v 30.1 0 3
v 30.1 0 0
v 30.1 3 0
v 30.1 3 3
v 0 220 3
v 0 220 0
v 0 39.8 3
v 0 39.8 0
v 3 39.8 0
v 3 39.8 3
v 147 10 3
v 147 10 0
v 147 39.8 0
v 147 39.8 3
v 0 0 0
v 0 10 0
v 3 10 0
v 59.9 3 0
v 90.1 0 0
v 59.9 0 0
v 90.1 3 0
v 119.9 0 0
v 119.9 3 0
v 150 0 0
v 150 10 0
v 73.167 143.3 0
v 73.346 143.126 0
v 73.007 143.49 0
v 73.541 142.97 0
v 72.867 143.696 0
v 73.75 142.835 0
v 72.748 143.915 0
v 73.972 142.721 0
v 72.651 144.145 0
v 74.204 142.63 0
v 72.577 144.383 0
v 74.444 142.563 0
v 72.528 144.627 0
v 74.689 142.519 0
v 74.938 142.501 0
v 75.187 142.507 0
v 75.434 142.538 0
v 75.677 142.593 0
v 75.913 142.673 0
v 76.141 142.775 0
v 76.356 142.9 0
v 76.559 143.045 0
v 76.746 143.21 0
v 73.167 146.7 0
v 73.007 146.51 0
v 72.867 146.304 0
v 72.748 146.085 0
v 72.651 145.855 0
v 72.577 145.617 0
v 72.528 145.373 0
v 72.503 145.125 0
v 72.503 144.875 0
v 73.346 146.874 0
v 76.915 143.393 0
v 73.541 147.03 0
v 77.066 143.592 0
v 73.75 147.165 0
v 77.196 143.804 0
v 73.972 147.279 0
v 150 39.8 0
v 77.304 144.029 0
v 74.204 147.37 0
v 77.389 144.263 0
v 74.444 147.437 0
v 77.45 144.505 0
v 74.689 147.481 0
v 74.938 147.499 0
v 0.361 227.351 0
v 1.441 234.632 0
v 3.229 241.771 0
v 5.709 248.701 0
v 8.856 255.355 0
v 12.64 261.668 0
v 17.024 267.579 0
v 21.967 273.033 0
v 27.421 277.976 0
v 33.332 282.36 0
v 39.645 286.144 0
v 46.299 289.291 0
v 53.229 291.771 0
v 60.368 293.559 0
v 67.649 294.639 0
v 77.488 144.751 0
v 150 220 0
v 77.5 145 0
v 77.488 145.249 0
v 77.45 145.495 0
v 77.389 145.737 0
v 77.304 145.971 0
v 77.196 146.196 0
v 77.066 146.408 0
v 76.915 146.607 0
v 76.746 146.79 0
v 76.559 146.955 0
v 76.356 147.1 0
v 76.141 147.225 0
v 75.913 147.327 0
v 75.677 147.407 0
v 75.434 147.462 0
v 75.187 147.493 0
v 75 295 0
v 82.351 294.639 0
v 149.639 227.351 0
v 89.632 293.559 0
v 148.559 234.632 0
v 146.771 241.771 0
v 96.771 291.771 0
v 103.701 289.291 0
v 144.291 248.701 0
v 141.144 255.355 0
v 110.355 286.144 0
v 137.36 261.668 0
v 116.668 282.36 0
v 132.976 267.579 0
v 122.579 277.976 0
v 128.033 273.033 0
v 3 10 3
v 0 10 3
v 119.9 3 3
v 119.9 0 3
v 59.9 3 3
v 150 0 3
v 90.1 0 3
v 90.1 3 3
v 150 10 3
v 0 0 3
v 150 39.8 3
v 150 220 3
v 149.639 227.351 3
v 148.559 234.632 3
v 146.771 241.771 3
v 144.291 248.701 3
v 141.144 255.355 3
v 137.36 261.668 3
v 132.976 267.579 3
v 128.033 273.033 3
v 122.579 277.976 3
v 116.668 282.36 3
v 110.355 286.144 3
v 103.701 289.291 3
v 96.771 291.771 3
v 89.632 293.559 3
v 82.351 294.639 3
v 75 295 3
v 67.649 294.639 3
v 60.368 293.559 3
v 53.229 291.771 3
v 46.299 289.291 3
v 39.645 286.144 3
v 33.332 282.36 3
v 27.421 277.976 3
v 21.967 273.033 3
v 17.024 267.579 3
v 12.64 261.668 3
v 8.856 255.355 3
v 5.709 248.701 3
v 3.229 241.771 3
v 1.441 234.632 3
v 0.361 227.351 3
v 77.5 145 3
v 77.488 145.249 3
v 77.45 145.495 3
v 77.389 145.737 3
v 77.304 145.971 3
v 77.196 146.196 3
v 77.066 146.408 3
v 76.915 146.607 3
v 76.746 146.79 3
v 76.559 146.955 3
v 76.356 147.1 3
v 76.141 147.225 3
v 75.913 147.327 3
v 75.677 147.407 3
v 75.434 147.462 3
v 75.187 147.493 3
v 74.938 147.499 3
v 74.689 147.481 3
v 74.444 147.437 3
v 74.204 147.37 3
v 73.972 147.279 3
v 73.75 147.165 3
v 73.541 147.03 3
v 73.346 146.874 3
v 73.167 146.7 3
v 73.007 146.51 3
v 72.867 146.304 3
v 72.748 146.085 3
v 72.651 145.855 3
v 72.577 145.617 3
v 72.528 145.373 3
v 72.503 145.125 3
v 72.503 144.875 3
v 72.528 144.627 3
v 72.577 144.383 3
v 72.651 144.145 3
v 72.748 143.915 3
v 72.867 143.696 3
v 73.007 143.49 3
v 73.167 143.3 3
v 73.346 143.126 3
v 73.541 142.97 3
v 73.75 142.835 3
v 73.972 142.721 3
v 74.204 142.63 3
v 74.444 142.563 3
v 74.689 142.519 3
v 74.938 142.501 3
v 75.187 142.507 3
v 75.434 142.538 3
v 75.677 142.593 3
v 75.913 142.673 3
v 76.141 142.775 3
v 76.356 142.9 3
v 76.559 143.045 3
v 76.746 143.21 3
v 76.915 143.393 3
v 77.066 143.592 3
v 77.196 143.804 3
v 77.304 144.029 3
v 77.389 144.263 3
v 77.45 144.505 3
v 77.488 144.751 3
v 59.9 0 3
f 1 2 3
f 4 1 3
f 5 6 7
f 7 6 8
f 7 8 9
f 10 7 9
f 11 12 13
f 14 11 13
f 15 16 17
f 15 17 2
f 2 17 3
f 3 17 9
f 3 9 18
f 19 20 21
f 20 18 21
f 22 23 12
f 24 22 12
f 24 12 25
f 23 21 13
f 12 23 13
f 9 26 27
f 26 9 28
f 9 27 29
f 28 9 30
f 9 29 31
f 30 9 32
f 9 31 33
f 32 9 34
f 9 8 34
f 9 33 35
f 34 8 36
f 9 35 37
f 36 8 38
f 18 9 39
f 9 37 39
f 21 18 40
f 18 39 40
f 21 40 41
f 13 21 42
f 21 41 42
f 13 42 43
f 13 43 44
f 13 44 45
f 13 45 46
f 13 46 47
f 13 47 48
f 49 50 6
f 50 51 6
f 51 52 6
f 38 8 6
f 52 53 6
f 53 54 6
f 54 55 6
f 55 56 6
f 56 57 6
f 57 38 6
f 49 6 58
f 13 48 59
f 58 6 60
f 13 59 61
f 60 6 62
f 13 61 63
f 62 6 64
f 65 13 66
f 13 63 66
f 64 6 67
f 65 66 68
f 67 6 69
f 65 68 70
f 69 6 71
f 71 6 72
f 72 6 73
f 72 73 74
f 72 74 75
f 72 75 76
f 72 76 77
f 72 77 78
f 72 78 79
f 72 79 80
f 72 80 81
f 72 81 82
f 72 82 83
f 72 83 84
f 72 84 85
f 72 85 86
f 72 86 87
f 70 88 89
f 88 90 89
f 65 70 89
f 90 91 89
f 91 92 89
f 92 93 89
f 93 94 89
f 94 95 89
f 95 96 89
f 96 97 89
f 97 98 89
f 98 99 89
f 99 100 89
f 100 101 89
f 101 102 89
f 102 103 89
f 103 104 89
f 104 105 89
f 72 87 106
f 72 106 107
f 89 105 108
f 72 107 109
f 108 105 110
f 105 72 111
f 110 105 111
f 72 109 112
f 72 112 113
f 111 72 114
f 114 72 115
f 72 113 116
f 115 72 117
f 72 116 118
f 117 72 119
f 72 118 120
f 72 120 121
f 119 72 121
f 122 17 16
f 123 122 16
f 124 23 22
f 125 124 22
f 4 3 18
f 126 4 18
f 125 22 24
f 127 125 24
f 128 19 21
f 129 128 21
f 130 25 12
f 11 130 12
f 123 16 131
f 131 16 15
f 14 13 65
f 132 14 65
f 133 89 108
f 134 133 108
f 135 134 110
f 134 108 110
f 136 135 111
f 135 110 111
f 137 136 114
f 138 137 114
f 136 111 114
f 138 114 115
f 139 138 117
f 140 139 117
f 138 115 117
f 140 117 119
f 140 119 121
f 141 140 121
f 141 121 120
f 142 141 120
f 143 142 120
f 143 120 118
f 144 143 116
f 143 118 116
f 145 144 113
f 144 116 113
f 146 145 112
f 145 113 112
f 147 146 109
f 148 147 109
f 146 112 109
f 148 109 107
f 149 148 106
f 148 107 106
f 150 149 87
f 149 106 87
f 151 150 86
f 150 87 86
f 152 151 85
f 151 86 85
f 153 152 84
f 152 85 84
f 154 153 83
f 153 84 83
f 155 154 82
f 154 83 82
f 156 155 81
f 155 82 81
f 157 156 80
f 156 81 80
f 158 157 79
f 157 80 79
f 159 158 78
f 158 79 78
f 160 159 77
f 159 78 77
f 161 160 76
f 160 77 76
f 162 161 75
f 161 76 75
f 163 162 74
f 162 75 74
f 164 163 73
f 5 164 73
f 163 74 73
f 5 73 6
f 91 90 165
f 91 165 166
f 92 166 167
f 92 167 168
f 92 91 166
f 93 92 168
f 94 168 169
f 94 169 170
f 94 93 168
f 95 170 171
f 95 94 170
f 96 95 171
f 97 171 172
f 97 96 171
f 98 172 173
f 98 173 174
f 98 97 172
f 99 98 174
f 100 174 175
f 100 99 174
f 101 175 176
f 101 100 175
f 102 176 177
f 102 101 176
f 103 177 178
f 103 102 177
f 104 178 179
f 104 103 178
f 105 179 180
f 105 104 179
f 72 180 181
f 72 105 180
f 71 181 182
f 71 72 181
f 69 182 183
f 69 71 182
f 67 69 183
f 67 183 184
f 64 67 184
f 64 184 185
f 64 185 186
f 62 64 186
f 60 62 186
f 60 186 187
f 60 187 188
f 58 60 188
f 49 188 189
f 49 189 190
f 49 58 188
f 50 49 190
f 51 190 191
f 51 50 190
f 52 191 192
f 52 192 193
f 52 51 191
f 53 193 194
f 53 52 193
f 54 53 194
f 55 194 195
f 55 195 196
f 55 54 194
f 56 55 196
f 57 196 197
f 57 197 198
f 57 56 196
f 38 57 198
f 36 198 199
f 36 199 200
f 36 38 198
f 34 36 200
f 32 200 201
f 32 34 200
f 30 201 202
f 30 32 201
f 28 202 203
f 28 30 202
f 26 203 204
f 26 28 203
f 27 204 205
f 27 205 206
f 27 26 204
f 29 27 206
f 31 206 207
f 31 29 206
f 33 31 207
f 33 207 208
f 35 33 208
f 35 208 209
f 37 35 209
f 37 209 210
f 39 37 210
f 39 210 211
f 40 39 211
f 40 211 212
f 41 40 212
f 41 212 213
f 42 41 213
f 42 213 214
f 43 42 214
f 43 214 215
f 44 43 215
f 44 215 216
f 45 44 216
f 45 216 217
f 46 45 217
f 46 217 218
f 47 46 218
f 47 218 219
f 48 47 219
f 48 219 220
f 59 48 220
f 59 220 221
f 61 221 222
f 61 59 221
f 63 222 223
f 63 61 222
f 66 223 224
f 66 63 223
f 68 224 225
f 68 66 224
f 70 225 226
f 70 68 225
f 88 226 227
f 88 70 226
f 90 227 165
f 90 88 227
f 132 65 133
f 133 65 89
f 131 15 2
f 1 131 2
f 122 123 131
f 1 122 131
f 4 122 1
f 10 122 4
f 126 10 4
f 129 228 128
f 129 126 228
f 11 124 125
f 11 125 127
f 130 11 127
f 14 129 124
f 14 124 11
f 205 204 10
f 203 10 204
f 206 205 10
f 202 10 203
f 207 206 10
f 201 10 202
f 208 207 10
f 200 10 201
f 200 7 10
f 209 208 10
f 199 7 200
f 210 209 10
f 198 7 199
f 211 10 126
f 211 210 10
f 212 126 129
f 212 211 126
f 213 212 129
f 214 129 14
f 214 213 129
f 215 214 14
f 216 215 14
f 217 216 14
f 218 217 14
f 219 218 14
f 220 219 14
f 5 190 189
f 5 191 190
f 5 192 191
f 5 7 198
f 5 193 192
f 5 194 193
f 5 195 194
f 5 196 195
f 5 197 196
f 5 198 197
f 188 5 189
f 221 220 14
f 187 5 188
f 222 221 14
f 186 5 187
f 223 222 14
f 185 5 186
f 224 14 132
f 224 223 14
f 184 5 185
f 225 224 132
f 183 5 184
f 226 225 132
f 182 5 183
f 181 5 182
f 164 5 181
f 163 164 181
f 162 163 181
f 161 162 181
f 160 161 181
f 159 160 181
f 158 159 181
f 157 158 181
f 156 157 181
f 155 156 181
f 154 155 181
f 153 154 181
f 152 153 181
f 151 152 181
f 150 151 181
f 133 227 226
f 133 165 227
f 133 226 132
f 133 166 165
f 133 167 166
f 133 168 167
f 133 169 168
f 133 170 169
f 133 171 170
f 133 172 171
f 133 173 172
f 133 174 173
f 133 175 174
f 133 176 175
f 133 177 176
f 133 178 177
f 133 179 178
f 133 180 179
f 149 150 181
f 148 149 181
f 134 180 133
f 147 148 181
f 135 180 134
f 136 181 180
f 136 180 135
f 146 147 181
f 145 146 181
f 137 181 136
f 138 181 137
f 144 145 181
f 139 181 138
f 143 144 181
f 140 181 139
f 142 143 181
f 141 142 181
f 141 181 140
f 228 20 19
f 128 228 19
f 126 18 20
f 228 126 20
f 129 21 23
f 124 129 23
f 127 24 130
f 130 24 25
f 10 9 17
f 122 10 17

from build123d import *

# Parameters (mm, degrees)
SKETCH1_R           = 2.5
BOSS_EXTRUDE1_DEPTH = 3


with BuildPart() as part:
    # Sketch1 → Boss-Extrude1 (new body)
    with BuildSketch(Plane.XY):
        with BuildLine():
            Line((59.9, 0), (90.1, 0))
            Line((90.1, 0), (90.1, 3))
            Line((90.1, 3), (119.9, 3))
            Line((119.9, 3), (119.9, 0))
            Line((119.9, 0), (150, 0))
            Line((150, 0), (150, 10))
            Line((150, 10), (147, 10))
            Line((147, 10), (147, 39.8))
            Line((147, 39.8), (150, 39.8))
            Line((150, 39.8), (150, 220))
            ThreePointArc((150, 220), (75, 295), (0, 220))
            Line((0, 220), (0, 39.8))
            Line((0, 39.8), (3, 39.8))
            Line((3, 39.8), (3, 10))
            Line((3, 10), (0, 10))
            Line((0, 10), (0, 0))
            Line((0, 0), (30.1, 0))
            Line((30.1, 0), (30.1, 3))
            Line((30.1, 3), (59.9, 3))
            Line((59.9, 3), (59.9, 0))
        make_face()
        with Locations((75, 145)):
            Circle(SKETCH1_R, mode=Mode.SUBTRACT)
    extrude(amount=BOSS_EXTRUDE1_DEPTH)


solid = part.part
